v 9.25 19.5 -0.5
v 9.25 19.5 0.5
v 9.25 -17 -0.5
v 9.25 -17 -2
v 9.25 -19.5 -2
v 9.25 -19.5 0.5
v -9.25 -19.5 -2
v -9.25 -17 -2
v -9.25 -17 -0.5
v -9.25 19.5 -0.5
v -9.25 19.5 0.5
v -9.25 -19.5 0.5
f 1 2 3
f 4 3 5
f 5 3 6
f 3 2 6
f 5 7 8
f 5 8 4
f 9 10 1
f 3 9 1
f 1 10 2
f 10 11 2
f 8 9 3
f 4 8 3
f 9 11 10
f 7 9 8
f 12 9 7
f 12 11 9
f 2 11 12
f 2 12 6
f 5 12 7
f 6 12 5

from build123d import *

# Parameters (mm, degrees)
F0_W     = 18.5
F0_H     = 39
F1_DEPTH = 0.5
F2_W     = 18.5
F2_H     = 2.5
F3_DEPTH = 1.5


with BuildPart() as f1:
    # F0 (on Top) → F1 (new body, symmetric)
    with BuildSketch(Plane.XY):
        Rectangle(F0_W, F0_H)
    extrude(amount=F1_DEPTH, both=True)

    # F2 (on face) → F3 (join)
    with BuildSketch(Plane(origin=(0, 0, -0.5), x_dir=(1, 0, 0), z_dir=(0, 0, -1))):
        with Locations((0, 18.25)):
            Rectangle(F2_W, F2_H)
    extrude(amount=F3_DEPTH)


solid = f1.part
